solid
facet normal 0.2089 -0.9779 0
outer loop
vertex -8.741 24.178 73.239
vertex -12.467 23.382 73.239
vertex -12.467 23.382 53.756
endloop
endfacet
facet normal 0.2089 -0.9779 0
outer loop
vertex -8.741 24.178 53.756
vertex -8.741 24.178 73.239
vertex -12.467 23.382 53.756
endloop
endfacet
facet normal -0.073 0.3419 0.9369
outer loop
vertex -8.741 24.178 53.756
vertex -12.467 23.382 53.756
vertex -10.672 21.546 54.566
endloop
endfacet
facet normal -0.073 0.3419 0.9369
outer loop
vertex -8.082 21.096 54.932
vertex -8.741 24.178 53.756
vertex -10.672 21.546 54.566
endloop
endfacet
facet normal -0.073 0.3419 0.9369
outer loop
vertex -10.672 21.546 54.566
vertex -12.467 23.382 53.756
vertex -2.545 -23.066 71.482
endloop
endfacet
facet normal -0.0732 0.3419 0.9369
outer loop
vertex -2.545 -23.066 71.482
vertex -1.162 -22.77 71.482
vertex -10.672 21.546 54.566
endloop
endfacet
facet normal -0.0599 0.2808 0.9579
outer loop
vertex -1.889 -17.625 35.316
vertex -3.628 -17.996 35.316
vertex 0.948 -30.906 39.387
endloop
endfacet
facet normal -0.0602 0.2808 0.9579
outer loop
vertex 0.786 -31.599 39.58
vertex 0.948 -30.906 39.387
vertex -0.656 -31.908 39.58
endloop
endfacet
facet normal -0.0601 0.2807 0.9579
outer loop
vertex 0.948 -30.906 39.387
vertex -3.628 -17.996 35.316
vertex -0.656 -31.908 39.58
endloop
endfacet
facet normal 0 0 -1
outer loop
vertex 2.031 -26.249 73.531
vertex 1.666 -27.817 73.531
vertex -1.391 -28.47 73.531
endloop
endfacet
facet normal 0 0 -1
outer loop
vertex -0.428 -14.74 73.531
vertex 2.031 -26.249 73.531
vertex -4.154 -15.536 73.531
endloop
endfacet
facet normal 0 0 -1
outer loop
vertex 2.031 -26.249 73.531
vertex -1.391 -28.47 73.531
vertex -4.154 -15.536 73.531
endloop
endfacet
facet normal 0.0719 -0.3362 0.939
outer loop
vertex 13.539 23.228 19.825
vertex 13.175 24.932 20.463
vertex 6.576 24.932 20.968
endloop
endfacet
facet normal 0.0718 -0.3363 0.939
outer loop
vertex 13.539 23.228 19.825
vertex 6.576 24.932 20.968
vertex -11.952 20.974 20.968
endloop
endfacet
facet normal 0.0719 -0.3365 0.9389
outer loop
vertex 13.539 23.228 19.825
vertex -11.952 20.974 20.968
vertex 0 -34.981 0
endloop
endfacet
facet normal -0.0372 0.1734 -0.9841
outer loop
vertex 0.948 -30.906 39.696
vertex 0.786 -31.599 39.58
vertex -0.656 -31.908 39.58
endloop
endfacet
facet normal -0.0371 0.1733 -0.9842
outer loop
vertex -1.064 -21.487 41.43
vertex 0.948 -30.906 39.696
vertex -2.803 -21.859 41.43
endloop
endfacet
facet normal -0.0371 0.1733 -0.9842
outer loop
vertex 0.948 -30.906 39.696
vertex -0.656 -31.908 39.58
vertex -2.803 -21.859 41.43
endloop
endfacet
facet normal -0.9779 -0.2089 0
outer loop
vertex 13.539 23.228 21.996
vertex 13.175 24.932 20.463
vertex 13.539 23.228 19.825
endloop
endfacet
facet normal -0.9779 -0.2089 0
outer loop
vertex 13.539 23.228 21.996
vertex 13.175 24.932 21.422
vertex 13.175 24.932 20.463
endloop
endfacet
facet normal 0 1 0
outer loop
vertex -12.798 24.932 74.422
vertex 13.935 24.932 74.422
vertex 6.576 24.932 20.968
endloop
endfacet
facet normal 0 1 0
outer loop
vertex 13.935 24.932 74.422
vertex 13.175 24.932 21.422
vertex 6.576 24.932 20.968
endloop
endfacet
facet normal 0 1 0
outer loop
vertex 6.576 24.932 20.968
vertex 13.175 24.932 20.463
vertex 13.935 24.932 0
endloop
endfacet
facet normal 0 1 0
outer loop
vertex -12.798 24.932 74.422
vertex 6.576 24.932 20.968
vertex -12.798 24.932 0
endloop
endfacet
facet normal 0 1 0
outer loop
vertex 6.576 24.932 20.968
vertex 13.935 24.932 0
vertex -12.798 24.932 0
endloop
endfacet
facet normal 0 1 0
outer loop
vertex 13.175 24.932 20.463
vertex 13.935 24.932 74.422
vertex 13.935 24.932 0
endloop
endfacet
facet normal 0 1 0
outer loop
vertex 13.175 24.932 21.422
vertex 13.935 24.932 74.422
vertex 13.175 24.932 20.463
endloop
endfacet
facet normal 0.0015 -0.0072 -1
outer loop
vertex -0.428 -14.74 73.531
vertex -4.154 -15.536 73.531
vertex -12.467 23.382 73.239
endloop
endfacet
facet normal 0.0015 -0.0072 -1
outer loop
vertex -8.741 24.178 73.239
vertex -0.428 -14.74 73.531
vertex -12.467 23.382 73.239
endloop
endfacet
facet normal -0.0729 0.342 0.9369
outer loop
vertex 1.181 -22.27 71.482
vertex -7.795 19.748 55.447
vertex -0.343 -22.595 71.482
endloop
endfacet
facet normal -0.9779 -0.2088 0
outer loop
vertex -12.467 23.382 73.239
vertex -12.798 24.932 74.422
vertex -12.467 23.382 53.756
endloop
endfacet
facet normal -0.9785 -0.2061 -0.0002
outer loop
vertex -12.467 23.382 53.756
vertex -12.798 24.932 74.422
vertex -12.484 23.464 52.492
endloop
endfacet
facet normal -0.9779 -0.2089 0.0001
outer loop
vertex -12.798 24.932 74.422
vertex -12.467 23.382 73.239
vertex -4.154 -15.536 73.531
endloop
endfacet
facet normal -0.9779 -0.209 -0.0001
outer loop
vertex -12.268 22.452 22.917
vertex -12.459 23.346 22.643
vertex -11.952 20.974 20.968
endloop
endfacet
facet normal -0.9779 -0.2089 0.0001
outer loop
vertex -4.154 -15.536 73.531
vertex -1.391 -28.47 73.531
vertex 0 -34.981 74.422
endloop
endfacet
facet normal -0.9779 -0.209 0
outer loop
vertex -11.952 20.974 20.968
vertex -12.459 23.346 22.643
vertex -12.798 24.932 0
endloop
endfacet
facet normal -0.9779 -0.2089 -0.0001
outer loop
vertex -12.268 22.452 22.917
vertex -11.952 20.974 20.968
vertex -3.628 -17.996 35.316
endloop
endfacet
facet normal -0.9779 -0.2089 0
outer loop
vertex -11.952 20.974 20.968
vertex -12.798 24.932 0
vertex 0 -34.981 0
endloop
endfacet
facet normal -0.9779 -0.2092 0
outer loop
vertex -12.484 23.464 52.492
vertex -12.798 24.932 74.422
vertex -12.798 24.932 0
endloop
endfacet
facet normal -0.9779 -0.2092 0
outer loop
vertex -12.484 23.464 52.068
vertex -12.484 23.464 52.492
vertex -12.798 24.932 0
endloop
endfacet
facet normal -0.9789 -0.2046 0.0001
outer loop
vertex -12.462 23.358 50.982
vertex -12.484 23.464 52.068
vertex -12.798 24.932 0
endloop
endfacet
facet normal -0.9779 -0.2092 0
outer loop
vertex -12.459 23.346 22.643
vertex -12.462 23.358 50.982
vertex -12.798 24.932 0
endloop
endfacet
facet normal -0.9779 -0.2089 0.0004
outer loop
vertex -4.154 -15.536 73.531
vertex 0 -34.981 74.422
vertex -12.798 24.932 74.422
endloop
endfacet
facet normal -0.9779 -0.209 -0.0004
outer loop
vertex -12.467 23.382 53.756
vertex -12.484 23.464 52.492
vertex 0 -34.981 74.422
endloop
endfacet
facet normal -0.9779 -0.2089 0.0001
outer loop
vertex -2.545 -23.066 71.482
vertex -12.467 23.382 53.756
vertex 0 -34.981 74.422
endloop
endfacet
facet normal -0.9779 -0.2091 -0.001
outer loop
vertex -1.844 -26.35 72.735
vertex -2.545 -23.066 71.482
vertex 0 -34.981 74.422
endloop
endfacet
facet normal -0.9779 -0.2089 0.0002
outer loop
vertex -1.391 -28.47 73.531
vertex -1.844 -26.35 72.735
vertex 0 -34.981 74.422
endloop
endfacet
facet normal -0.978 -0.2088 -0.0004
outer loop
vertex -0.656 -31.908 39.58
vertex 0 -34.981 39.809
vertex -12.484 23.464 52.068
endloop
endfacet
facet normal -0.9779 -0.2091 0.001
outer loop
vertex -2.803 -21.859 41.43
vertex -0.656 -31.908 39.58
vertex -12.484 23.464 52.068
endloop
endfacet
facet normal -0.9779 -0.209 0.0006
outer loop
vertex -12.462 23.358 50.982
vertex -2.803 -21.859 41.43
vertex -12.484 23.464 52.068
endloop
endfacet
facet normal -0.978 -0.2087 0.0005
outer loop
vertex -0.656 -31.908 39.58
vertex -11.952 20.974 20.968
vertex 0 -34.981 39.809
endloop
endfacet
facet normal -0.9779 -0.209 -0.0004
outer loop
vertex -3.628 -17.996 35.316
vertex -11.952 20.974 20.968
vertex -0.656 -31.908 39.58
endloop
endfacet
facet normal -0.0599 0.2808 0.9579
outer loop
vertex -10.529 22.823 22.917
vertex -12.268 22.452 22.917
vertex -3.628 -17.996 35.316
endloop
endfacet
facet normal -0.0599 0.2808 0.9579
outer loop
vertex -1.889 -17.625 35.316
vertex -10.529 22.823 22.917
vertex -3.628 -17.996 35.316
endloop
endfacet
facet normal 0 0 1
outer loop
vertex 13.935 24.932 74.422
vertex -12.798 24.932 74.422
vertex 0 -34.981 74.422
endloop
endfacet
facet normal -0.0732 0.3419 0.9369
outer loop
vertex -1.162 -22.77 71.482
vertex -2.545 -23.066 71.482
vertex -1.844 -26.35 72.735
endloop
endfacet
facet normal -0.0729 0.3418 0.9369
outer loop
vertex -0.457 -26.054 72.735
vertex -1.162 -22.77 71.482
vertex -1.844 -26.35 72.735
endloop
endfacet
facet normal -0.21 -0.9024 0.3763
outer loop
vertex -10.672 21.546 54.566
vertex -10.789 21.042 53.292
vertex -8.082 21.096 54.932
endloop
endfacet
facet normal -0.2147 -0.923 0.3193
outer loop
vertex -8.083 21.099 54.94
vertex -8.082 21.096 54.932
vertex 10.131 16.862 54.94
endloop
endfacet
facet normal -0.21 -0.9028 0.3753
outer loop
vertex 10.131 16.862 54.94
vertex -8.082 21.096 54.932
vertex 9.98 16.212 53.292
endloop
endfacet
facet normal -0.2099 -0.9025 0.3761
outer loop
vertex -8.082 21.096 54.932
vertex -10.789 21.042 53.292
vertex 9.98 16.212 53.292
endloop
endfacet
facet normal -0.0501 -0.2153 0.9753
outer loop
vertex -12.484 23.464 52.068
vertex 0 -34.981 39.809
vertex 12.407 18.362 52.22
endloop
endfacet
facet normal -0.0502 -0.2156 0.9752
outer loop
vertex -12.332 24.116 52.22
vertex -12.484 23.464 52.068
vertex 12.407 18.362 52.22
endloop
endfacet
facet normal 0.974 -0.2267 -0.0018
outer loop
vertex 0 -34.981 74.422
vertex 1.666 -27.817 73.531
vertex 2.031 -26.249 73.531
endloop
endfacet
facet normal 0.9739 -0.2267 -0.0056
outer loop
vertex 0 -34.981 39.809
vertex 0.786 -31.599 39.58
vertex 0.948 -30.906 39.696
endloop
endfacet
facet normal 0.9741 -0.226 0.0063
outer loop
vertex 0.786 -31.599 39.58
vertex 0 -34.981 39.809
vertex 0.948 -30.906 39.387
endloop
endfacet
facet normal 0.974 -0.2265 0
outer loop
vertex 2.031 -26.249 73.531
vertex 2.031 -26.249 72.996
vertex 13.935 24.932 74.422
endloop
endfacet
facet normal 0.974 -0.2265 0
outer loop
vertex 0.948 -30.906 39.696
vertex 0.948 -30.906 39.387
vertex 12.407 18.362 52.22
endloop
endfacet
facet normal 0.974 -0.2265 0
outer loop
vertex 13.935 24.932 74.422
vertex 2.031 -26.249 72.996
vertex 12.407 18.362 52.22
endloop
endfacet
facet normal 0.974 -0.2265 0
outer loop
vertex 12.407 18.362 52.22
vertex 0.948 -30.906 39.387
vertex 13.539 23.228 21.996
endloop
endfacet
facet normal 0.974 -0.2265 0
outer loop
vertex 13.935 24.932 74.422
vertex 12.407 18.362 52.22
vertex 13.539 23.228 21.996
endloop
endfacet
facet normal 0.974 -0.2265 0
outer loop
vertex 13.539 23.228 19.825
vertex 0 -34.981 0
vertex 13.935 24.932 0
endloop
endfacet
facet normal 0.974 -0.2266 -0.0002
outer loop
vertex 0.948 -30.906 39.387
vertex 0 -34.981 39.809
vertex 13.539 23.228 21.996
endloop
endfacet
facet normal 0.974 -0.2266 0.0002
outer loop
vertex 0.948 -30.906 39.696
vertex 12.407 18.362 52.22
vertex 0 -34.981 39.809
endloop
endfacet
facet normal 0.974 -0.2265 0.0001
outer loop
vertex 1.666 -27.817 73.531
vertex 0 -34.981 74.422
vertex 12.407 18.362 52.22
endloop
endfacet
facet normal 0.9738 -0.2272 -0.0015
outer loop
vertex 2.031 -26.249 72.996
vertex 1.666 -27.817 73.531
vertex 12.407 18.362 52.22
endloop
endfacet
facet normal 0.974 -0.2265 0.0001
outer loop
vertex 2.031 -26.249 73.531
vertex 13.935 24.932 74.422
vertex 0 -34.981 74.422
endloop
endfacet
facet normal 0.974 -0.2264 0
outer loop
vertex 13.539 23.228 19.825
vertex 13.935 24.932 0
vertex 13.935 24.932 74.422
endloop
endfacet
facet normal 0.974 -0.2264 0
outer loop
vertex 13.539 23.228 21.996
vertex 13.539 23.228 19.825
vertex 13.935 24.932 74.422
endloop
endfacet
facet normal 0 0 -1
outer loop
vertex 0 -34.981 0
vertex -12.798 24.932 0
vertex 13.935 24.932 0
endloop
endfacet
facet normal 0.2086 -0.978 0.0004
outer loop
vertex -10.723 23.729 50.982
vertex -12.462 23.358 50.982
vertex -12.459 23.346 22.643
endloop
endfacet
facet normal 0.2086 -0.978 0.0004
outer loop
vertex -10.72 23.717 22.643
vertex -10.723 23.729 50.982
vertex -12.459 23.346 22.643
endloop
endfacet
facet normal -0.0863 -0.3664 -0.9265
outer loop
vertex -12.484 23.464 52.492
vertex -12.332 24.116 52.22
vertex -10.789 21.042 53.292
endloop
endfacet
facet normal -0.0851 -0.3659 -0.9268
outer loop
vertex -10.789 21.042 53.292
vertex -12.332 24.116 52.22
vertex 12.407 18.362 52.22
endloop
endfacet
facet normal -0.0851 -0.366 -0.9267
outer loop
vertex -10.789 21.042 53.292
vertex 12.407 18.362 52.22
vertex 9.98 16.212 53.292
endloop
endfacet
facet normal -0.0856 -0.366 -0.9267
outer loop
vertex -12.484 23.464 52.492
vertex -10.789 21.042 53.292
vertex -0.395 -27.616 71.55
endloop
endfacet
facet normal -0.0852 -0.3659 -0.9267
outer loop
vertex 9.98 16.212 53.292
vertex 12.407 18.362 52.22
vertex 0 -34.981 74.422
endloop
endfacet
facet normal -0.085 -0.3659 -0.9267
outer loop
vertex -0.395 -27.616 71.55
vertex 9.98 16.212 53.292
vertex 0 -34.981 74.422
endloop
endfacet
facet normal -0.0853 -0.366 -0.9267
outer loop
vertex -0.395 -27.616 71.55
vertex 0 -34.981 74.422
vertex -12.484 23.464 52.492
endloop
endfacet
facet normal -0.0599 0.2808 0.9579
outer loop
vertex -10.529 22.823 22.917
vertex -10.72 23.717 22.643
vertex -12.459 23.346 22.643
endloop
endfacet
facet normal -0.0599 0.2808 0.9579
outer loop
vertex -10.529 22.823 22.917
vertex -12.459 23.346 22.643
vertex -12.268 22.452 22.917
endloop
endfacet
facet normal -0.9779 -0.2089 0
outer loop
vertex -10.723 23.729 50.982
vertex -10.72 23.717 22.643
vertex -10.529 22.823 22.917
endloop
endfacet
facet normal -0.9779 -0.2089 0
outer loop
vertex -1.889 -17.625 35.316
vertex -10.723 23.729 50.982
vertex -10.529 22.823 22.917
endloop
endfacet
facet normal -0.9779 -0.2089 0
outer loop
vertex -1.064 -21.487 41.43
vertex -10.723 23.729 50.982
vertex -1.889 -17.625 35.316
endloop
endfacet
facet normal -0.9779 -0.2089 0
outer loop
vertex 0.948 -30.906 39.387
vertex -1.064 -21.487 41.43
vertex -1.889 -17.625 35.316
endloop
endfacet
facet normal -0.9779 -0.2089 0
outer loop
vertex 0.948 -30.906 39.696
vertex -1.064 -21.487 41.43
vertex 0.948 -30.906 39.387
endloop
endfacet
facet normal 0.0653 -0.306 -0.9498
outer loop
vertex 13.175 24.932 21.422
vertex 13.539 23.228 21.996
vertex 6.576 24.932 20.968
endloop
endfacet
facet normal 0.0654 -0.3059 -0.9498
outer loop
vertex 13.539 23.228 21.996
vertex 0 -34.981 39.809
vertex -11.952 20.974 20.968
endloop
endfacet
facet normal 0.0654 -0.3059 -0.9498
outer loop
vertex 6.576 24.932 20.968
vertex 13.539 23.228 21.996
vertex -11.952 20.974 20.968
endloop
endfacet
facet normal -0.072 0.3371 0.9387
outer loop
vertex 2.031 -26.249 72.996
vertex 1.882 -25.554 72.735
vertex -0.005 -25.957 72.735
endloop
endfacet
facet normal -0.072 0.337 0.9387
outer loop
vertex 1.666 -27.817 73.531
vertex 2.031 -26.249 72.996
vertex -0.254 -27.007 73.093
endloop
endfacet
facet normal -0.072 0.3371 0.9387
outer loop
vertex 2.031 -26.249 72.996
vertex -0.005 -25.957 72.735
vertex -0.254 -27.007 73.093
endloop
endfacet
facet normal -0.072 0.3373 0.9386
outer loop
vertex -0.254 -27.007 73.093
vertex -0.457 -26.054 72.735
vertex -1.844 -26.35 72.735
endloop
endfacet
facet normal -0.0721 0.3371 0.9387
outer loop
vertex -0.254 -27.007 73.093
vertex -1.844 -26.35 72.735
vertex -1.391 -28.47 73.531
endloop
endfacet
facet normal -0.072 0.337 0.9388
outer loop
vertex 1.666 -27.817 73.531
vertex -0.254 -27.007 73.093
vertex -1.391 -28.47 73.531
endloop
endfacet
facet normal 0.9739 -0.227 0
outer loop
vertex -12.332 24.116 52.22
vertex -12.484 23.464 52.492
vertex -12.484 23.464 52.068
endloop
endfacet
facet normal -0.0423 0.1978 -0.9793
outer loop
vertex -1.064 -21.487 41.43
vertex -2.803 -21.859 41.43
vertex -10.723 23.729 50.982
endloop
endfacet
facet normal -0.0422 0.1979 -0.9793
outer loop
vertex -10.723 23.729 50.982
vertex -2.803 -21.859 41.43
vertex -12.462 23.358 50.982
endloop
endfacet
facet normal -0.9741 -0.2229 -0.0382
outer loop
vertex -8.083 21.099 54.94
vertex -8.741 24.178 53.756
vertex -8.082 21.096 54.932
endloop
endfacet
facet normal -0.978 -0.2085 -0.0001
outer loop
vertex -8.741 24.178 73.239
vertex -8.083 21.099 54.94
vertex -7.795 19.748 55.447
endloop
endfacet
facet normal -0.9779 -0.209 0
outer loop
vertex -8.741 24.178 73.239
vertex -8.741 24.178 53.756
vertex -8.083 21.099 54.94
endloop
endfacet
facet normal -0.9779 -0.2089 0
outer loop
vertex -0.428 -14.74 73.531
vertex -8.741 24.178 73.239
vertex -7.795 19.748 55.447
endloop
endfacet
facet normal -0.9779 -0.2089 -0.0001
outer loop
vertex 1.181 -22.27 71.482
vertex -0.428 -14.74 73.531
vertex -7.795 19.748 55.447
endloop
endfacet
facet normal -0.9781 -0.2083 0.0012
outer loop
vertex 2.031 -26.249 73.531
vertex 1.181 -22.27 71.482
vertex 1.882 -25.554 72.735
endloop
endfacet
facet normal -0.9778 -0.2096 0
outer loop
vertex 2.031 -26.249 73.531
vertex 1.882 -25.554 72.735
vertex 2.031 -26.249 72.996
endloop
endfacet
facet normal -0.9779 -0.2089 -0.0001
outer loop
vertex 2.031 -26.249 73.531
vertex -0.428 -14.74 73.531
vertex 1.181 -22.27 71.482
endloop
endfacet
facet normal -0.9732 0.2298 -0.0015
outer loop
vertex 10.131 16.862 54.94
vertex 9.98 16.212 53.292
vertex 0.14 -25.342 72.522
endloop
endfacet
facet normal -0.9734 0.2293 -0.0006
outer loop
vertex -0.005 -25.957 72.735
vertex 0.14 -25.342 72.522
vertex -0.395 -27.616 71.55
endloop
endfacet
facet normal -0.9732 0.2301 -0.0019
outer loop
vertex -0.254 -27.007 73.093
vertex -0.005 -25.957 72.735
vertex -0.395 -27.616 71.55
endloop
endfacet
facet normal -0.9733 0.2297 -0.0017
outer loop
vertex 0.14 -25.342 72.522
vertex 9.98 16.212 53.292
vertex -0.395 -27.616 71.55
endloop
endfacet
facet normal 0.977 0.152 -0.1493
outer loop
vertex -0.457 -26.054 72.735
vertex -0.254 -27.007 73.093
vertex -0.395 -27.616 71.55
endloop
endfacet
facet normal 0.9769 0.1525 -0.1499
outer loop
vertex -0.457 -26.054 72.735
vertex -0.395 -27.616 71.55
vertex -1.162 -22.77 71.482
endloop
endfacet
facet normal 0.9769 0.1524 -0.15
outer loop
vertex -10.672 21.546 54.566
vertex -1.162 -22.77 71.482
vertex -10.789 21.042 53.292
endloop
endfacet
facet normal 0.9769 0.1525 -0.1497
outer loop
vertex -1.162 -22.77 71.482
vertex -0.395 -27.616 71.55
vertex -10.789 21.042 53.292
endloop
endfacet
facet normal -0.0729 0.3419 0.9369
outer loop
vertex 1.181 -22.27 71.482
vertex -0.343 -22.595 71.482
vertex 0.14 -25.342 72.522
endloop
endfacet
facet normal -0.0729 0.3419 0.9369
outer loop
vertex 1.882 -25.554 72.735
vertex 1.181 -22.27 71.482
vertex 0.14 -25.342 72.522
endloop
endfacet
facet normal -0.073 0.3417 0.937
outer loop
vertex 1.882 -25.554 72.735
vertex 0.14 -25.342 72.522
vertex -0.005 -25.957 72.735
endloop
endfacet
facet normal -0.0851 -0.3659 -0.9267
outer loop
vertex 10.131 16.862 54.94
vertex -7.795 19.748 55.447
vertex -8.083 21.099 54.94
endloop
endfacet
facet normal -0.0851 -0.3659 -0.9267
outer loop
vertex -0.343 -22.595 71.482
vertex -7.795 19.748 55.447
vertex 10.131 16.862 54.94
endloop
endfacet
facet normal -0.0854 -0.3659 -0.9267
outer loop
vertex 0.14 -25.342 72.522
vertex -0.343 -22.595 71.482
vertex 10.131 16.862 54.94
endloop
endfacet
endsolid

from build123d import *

# Parameters (mm, degrees)
F1_DEPTH  = 74.422
F3_DEPTH  = 25.4
F5_DEPTH  = 25.4
F7_DEPTH  = 3.81
F9_DEPTH  = 1.778
F11_DEPTH = 1.778


with BuildPart() as f1:
    # F0 (on Top) → F1 (new body)
    with BuildSketch(Plane.XY):
        Polygon((13.9353908598, 24.9320268631), (-12.7978082746, 24.9320268631), (0, -34.9806770682), align=None)
    extrude(amount=F1_DEPTH)

    # F2 (on face) → F3 (cut)
    with BuildSketch(Plane(origin=(7.718740982, -1.7953399775, 0), x_dir=(0.226547485, 0.9740001217, 0), z_dir=(0.9740001217, -0.226547485, 0))):
        Polygon((20.695079118, 52.2201247513), (-34.0711837213, 74.422), (-34.0711837213, 39.8090481758), align=None)
    extrude(amount=-F3_DEPTH, mode=Mode.SUBTRACT)

    # F4 (on face) → F5 (cut)
    with BuildSketch(Plane(origin=(-7.1460755316, -1.5264559696, 0), x_dir=(0.2088949953, -0.9779380762, 0), z_dir=(-0.9779380762, -0.2088949953, 0))):
        Polygon((34.2089360376, 0), (34.2089360376, 39.8090481758), (-23.0083428323, 20.9681969136), align=None)
    extrude(amount=-F5_DEPTH, mode=Mode.SUBTRACT)

    # F6 (on face) → F7 (cut)
    with BuildSketch(Plane(origin=(-7.1460755316, -1.5264559696, 0), x_dir=(0.2088949953, -0.9779380762, 0), z_dir=(-0.9779380762, -0.2088949953, 0))):
        Polygon((14.3255656585, 73.5306164718), (-25.4703722894, 73.2393935323), (-25.4703722894, 53.7560619414), (22.024974227, 71.4815631509), (25.38343653, 72.7349581039), (27.5516982051, 73.5306164718), align=None)
    extrude(amount=-F7_DEPTH, mode=Mode.SUBTRACT)

    # F8 (on face) → F9 (cut)
    with BuildSketch(Plane(origin=(-7.1460755316, -1.5264559696, 0), x_dir=(0.2088949953, -0.9779380762, 0), z_dir=(-0.9779380762, -0.2088949953, 0))):
        Polygon((20.7908283919, 41.430156678), (-25.4458747804, 50.9817264974), (-25.4333440341, 22.6434153364), (-24.5192568436, 22.9174265555), (16.8412234634, 35.3158451617), (31.0665536672, 39.5800992846), align=None)
    extrude(amount=-F9_DEPTH, mode=Mode.SUBTRACT)

    # F10 (on face) → F11 (cut)
    with BuildSketch(Plane(origin=(4.7807632282, 20.554030722, 52.0548786677), x_dir=(0.9963713167, -0.031258558, -0.0791650292), z_dir=(-0.0851128621, -0.3659274261, -0.9267431788))):
        Polygon((5.2179168689, 4.4931433875), (-5.1948507316, 51.9638061523), (-15.6265430034, 0), align=None)
    extrude(amount=-F11_DEPTH, mode=Mode.SUBTRACT)


solid = f1.part
